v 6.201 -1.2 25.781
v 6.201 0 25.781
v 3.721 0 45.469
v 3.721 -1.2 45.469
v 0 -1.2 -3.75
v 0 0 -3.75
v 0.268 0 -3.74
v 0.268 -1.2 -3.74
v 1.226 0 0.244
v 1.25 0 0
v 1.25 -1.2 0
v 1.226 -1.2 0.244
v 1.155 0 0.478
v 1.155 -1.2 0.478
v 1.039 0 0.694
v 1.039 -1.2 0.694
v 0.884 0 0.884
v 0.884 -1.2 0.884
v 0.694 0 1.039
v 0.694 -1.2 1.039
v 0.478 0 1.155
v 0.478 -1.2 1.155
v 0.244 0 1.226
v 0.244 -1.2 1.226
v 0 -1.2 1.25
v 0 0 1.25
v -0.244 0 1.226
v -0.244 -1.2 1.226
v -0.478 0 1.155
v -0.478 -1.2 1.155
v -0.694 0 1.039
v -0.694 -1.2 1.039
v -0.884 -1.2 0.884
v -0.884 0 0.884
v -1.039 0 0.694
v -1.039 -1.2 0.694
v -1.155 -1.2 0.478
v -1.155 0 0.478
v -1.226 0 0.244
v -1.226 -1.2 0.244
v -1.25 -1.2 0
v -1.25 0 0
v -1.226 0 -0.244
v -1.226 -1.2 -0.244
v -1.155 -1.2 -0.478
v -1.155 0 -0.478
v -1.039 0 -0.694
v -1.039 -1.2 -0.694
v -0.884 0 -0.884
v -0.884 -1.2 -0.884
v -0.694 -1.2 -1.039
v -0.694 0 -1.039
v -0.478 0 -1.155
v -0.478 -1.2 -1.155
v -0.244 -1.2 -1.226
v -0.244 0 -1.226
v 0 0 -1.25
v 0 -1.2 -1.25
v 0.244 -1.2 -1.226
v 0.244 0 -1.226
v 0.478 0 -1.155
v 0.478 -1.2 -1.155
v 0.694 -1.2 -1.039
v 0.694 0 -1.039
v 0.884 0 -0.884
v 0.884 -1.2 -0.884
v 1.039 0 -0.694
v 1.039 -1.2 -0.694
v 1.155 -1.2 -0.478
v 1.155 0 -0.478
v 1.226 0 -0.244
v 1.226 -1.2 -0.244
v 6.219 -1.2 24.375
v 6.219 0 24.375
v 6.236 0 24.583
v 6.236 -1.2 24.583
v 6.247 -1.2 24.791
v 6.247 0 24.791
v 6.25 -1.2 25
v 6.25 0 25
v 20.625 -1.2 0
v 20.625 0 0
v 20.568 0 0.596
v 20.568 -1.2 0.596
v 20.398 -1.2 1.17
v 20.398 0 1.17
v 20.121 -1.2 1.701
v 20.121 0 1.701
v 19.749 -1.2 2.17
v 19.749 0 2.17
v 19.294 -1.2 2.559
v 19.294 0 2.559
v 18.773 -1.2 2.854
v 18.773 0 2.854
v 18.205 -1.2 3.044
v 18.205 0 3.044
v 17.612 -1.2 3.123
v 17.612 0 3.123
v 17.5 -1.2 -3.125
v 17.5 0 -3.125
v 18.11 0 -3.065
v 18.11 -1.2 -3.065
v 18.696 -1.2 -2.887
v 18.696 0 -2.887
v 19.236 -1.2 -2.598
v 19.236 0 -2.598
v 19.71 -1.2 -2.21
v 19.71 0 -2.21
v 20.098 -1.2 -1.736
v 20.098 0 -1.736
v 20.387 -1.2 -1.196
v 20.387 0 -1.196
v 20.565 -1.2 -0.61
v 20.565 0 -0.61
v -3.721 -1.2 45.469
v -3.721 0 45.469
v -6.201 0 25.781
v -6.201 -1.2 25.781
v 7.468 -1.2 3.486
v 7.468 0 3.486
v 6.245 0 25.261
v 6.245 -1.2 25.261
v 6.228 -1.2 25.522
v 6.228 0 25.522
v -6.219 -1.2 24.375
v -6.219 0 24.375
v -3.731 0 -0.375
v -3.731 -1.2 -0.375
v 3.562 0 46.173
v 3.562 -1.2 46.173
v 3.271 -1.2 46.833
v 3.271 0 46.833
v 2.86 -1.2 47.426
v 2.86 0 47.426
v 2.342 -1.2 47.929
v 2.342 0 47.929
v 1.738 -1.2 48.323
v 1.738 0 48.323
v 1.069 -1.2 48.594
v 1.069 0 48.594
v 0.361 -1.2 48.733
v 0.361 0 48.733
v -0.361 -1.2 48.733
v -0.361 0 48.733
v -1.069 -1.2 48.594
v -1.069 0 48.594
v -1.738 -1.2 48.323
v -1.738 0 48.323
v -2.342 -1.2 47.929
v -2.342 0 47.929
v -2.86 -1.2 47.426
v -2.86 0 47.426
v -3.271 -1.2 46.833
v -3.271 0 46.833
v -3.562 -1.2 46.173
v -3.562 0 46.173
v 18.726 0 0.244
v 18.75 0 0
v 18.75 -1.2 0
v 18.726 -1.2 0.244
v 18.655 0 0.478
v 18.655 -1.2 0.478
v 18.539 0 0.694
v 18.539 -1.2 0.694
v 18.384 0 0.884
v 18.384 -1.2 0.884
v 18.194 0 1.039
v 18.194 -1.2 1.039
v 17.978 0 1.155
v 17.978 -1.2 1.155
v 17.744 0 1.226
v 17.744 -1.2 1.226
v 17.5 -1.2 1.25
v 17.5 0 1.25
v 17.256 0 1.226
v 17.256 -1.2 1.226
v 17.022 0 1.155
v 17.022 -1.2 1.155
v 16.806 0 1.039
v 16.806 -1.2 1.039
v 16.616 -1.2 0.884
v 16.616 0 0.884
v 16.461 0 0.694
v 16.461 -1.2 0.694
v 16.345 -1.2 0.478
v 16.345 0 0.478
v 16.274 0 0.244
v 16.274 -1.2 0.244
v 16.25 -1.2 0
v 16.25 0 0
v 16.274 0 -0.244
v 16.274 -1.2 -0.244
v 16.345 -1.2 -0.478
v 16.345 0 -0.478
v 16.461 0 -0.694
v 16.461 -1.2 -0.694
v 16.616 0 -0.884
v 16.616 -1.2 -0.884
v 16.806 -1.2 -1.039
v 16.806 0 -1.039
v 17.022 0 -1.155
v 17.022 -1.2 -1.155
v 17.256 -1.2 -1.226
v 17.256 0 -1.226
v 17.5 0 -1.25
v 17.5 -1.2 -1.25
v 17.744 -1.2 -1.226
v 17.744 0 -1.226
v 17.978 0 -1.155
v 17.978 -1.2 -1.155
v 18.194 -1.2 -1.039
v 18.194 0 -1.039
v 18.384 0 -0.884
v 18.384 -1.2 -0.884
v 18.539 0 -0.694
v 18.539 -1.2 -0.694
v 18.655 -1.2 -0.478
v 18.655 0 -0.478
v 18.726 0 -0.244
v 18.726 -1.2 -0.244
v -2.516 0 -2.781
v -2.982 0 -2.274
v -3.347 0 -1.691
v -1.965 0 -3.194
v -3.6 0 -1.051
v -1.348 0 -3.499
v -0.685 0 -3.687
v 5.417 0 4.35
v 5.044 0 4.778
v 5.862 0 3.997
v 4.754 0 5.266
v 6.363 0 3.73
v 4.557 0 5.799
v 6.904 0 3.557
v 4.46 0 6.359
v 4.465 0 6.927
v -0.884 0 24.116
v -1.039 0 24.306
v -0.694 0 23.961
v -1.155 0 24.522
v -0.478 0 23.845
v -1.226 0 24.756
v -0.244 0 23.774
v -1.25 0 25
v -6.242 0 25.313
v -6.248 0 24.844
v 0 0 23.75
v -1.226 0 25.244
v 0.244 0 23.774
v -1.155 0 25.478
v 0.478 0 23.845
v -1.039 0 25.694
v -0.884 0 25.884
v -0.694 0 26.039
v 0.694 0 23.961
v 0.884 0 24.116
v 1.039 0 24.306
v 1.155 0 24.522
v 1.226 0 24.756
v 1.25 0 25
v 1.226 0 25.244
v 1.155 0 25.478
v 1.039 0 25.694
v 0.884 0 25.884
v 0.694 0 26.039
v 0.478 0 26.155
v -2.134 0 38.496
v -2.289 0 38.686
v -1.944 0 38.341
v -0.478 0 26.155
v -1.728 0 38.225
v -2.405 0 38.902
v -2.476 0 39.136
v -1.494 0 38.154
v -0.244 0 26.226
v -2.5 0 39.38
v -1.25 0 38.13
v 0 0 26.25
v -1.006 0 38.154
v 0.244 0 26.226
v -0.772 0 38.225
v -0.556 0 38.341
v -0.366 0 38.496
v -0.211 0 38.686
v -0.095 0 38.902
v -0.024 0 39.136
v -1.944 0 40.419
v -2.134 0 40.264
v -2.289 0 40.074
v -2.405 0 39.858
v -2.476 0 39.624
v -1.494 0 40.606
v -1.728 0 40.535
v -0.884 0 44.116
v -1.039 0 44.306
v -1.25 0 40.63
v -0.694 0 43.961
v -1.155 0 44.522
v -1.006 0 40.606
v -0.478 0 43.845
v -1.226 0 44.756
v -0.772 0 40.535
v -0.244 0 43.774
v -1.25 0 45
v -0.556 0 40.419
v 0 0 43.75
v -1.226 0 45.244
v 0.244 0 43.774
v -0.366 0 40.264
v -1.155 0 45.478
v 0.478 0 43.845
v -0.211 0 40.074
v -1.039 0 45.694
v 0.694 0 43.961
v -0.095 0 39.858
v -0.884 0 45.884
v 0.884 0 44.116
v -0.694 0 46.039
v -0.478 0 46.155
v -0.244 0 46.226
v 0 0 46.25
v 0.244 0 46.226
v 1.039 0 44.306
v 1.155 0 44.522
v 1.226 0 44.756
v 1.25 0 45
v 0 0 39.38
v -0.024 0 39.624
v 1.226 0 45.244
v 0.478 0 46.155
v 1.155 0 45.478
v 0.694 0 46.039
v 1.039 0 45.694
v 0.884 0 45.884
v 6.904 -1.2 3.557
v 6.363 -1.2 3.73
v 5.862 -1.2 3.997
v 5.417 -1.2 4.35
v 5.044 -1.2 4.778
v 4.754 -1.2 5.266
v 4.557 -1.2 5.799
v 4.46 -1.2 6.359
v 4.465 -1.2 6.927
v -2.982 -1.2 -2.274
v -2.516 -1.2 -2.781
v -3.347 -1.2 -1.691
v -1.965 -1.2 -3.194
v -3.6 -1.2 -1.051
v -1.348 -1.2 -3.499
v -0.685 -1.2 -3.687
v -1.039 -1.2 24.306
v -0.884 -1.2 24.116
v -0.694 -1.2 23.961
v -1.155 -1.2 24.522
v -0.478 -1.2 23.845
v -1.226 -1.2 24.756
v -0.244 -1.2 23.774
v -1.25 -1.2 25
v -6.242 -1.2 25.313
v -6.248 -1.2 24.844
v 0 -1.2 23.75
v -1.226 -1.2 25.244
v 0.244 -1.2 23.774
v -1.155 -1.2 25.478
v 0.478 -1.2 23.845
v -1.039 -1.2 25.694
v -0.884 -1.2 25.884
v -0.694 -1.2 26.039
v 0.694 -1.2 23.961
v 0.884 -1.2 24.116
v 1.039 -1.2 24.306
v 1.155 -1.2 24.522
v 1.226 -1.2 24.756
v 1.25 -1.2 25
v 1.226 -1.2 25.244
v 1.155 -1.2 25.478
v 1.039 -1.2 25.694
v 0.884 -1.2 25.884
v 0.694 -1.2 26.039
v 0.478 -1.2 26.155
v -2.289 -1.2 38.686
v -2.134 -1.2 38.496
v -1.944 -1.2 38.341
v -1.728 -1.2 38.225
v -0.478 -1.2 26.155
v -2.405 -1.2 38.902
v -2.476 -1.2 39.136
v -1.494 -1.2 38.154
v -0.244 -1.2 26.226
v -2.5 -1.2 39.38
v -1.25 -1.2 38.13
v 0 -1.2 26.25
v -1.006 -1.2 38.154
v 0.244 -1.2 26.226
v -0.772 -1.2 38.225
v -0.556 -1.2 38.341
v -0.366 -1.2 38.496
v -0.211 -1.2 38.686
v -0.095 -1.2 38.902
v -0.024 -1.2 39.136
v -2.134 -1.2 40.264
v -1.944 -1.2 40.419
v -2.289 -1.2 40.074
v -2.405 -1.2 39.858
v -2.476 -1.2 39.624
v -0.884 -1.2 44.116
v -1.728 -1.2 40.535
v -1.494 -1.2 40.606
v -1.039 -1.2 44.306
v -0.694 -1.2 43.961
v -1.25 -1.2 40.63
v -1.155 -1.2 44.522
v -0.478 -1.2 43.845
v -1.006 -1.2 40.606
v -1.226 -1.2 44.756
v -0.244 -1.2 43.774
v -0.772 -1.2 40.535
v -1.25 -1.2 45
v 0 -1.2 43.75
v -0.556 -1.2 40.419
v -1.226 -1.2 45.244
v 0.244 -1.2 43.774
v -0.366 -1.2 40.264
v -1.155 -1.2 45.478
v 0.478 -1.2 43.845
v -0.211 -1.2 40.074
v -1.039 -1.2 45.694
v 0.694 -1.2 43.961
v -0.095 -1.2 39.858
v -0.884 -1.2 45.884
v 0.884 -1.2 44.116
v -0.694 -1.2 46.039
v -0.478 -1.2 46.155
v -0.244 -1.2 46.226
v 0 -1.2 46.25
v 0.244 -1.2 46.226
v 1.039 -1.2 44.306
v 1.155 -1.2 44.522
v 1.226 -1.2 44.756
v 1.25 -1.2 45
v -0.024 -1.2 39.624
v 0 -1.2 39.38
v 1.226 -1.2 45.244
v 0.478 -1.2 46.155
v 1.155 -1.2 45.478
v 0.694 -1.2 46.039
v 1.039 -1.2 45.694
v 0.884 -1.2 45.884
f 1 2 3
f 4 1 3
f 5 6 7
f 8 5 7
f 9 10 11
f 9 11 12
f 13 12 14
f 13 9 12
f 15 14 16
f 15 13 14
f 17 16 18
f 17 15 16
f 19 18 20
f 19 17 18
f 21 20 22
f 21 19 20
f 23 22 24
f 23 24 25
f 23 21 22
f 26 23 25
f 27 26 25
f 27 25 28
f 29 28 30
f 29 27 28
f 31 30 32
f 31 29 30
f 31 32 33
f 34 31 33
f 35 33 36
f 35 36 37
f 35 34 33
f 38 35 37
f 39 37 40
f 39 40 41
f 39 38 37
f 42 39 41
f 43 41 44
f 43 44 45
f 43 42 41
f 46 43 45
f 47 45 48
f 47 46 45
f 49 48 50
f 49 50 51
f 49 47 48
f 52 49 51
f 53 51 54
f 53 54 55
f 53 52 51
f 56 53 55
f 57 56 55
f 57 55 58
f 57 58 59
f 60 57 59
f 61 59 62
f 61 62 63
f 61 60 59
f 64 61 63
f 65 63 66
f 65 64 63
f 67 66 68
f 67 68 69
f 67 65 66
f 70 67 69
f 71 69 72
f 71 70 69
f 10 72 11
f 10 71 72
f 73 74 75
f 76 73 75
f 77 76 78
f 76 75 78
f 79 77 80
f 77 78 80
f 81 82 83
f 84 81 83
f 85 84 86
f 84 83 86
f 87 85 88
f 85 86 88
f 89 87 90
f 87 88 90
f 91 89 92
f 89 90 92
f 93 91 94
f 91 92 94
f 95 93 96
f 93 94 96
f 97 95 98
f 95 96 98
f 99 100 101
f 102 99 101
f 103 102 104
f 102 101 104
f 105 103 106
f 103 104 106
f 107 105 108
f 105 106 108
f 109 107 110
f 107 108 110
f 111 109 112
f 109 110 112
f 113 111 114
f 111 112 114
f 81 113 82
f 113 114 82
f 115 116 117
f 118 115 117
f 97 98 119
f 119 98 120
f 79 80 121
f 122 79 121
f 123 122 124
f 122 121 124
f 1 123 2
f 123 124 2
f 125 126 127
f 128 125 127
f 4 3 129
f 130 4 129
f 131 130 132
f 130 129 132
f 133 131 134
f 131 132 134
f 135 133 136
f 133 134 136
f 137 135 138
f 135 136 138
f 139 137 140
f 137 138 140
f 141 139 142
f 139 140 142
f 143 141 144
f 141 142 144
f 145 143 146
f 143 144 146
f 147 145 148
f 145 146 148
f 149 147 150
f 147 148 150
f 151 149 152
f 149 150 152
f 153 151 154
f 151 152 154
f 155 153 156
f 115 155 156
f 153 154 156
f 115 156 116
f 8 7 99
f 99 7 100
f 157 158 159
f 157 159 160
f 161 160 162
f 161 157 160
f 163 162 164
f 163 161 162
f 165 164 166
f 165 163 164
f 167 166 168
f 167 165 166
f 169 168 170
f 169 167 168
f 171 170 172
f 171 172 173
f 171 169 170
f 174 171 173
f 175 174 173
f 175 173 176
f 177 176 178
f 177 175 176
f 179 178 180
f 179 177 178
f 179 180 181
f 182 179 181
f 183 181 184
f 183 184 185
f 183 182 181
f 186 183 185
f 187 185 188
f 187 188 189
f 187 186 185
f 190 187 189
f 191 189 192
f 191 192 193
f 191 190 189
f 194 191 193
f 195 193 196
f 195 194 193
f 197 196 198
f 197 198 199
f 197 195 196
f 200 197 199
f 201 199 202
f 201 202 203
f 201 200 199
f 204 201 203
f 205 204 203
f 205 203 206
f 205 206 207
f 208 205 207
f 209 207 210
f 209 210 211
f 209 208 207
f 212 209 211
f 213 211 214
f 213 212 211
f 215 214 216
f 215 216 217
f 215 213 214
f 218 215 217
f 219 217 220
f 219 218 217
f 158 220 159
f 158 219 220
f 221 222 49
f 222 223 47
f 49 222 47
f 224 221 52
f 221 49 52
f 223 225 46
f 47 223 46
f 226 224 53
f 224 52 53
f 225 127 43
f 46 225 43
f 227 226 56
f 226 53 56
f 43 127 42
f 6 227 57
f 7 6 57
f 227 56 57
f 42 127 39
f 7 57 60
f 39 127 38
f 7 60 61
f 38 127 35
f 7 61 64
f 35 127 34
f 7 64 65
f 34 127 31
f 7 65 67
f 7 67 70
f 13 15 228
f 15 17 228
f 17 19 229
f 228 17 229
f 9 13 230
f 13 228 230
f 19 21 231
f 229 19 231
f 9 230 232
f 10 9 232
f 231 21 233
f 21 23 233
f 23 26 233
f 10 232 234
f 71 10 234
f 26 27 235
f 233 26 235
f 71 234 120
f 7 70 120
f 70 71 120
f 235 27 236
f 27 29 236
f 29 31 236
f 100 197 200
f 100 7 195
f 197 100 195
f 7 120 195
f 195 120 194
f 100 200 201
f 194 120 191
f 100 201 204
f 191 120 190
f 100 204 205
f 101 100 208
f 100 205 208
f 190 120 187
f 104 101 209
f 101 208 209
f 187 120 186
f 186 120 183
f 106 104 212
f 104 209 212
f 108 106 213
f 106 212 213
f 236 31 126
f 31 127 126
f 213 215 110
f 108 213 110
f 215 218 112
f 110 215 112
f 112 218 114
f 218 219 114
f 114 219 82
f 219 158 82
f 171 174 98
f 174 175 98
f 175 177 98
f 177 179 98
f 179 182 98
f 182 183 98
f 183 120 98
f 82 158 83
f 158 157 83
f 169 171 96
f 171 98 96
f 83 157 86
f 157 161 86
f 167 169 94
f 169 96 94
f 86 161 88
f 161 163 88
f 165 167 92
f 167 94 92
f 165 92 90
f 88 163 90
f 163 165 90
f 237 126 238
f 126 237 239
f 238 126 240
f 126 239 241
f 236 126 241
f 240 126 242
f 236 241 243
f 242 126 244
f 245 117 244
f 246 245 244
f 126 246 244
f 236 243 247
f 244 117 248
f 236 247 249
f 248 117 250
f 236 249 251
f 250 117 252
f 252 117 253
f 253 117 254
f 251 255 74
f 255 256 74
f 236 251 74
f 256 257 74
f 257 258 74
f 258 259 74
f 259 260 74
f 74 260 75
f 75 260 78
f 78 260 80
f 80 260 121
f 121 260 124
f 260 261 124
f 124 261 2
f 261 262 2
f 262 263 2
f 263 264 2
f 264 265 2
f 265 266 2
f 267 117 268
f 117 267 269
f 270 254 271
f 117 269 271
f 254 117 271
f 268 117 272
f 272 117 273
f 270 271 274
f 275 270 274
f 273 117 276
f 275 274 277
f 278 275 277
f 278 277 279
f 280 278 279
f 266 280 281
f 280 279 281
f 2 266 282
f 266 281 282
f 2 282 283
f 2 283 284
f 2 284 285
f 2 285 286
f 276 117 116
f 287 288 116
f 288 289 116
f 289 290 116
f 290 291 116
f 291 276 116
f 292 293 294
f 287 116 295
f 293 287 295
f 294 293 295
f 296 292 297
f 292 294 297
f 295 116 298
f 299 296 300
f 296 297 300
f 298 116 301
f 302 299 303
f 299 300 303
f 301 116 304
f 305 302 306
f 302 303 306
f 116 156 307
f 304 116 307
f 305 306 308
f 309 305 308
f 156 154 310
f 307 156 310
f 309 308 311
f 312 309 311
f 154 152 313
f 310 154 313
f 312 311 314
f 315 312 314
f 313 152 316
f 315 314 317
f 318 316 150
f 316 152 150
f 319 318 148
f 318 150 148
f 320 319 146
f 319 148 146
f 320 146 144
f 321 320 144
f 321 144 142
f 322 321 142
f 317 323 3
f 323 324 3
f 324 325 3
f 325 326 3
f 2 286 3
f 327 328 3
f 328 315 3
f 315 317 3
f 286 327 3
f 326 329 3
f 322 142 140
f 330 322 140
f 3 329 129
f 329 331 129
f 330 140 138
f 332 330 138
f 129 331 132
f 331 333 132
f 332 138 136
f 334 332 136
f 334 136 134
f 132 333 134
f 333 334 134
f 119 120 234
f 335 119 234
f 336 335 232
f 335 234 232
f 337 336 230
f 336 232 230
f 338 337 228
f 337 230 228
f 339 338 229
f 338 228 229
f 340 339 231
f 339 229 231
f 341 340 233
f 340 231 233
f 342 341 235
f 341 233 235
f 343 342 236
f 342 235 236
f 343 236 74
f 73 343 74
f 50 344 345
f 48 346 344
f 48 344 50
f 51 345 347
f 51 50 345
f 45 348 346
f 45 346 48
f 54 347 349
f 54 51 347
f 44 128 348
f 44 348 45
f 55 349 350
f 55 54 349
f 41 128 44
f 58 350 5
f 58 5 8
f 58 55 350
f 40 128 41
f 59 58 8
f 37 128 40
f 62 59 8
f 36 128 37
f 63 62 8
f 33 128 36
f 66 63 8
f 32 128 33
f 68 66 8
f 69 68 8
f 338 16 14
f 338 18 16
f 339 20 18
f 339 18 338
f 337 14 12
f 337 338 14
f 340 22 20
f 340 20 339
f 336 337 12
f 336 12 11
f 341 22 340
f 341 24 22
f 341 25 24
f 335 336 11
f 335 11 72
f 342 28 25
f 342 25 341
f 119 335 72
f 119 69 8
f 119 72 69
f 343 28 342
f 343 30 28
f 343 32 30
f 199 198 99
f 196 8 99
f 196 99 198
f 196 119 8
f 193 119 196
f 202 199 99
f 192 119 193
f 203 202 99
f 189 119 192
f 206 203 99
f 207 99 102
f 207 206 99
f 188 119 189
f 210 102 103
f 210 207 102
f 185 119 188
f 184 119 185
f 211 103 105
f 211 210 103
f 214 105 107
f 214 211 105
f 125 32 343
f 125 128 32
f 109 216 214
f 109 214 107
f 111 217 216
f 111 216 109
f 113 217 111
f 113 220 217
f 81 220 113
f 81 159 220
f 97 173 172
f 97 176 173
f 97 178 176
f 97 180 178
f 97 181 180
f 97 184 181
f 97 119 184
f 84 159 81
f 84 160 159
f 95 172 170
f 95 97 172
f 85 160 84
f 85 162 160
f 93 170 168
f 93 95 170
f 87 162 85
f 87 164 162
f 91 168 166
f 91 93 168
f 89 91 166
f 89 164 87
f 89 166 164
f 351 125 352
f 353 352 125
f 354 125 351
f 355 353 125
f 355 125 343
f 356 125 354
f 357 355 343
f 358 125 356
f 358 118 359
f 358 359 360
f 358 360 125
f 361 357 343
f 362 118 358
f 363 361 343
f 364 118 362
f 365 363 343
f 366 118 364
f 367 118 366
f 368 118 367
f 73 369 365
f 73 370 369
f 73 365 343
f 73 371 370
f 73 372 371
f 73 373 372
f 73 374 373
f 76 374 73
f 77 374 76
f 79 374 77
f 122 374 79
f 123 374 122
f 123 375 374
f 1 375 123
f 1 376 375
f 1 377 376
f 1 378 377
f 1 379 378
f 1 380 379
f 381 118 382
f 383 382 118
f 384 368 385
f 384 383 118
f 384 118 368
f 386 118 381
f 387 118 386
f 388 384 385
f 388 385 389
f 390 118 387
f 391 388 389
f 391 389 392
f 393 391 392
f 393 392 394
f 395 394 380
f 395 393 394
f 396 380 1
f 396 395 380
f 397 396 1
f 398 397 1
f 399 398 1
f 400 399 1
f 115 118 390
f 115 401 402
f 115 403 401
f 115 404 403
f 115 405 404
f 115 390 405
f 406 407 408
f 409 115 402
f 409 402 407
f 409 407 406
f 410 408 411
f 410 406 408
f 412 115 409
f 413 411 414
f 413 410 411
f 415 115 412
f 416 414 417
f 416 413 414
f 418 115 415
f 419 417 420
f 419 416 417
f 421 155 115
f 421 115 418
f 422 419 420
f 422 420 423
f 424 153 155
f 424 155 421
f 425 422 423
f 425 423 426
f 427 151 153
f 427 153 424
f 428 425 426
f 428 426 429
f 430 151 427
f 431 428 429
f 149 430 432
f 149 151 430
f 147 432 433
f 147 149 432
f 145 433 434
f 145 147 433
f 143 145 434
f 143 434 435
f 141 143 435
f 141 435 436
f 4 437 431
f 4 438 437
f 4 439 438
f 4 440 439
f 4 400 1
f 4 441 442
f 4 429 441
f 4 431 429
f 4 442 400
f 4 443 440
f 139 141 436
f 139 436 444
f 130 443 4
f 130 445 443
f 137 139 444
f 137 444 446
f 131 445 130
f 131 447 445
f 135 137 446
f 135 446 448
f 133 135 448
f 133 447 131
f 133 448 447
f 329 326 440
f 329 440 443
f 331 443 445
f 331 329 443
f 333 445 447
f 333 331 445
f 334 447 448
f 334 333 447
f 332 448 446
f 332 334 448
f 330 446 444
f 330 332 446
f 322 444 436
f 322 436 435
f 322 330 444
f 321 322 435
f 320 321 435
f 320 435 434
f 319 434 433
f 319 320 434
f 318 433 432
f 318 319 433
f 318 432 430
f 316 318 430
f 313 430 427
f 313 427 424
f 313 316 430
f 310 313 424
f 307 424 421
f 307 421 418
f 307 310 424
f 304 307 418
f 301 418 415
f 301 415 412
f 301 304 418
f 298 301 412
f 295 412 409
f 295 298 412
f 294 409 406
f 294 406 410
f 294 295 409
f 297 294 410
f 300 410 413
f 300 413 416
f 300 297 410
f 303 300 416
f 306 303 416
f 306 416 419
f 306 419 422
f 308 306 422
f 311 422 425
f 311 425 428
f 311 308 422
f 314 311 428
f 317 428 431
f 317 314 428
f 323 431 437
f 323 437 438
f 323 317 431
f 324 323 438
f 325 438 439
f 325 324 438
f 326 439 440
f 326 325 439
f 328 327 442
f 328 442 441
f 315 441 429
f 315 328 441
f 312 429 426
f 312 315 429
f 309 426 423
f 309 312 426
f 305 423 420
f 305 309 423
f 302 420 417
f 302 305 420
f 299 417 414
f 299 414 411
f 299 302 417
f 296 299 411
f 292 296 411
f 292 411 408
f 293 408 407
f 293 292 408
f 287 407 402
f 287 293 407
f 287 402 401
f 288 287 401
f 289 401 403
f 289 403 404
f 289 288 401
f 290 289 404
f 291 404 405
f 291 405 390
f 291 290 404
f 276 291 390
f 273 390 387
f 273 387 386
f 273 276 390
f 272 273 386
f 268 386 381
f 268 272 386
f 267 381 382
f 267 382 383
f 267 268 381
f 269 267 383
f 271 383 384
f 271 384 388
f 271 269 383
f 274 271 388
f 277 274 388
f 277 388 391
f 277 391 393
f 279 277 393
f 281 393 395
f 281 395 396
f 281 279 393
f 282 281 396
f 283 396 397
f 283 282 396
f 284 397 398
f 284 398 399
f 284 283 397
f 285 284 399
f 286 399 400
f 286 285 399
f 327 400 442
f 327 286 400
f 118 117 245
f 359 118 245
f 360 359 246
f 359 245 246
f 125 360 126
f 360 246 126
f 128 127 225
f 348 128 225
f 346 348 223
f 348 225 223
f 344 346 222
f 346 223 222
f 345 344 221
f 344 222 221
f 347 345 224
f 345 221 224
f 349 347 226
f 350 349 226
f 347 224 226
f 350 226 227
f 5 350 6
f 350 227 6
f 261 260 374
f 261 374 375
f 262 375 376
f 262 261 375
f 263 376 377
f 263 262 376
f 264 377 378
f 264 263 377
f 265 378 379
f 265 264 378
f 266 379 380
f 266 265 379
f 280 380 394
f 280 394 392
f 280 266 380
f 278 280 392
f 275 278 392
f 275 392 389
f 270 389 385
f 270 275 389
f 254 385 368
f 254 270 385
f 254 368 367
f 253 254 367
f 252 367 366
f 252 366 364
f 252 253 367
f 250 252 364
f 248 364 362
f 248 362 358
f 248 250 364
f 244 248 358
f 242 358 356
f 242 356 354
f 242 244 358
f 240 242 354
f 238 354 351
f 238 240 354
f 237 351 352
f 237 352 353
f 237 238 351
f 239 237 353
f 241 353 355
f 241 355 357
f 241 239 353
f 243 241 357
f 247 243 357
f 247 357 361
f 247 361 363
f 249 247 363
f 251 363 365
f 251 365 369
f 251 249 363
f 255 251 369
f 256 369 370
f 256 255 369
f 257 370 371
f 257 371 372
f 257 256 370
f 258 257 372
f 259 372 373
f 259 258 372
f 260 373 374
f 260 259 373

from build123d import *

# Parameters (mm, degrees)
F0_R     = 1.25
F1_DEPTH = 1.2


with BuildPart() as f1:
    # F0 (on Front) → F1 (new body)
    with BuildSketch(Plane.XZ):
        with BuildLine():
            ThreePointArc((-3.731203, -0.375), (-0.187735, 3.745298), (3.75, 0))
            ThreePointArc((3.75, 0), (2.744602, -2.555319), (0.267516, -3.740446))
            Line((0.267516, -3.740446), (17.5, -3.125))
            ThreePointArc((17.5, -3.125), (14.375498, 0.055812), (17.611607, 3.123006))
            Line((17.611607, 3.123006), (7.467559, 3.485525))
            ThreePointArc((7.467559, 3.485525), (5.220945, 4.555653), (4.465034, 6.926528))
            Line((4.465034, 6.926528), (6.218671, 24.375))
            ThreePointArc((6.218671, 24.375), (0, 18.75), (-6.218671, 24.375))
            Line((-6.218671, 24.375), (-3.731203, -0.375))
        make_face()
        with BuildLine():
            Line((-3.720588, 45.46875), (-6.20098, 25.78125))
            ThreePointArc((-6.20098, 25.78125), (0, 31.25), (6.20098, 25.78125))
            Line((6.20098, 25.78125), (3.720588, 45.46875))
            ThreePointArc((3.720588, 45.46875), (3.74264, 45.234836), (3.75, 45))
            ThreePointArc((3.75, 45), (-0.234836, 41.25736), (-3.720588, 45.46875))
        make_face()
        with Locations((-1.25, 39.38)):
            Circle(F0_R, mode=Mode.SUBTRACT)
        with BuildLine():
            ThreePointArc((-6.20098, 25.78125), (-6.249505, 25.078624), (-6.218671, 24.375))
            ThreePointArc((-6.218671, 24.375), (0, 18.75), (6.218671, 24.375))
            ThreePointArc((6.218671, 24.375), (6.242163, 24.687108), (6.25, 25))
            ThreePointArc((6.25, 25), (6.237733, 25.391393), (6.20098, 25.78125))
            ThreePointArc((6.20098, 25.78125), (0, 31.25), (-6.20098, 25.78125))
        make_face()
        with Locations((0, 25)):
            Circle(F0_R, mode=Mode.SUBTRACT)
        with BuildLine():
            ThreePointArc((3.720588, 45.46875), (0, 48.75), (-3.720588, 45.46875))
            ThreePointArc((-3.720588, 45.46875), (-0.234836, 41.25736), (3.75, 45))
            ThreePointArc((3.75, 45), (3.74264, 45.234836), (3.720588, 45.46875))
        make_face()
        with Locations((0, 45)):
            Circle(F0_R, mode=Mode.SUBTRACT)
        with BuildLine():
            ThreePointArc((0.267516, -3.740446), (2.744602, -2.555319), (3.75, 0))
            ThreePointArc((3.75, 0), (-0.187735, 3.745298), (-3.731203, -0.375))
            ThreePointArc((-3.731203, -0.375), (-2.515576, -2.781074), (0, -3.75))
            Line((0, -3.75), (0.267516, -3.740446))
        make_face()
        Circle(F0_R, mode=Mode.SUBTRACT)
        with BuildLine():
            ThreePointArc((17.611607, 3.123006), (14.375498, 0.055812), (17.5, -3.125))
            ThreePointArc((17.5, -3.125), (19.709709, -2.209709), (20.625, 0))
            ThreePointArc((20.625, 0), (19.748822, 2.169891), (17.611607, 3.123006))
        make_face()
        with Locations((17.5, 0)):
            Circle(F0_R, mode=Mode.SUBTRACT)
    extrude(amount=F1_DEPTH)


solid = f1.part
